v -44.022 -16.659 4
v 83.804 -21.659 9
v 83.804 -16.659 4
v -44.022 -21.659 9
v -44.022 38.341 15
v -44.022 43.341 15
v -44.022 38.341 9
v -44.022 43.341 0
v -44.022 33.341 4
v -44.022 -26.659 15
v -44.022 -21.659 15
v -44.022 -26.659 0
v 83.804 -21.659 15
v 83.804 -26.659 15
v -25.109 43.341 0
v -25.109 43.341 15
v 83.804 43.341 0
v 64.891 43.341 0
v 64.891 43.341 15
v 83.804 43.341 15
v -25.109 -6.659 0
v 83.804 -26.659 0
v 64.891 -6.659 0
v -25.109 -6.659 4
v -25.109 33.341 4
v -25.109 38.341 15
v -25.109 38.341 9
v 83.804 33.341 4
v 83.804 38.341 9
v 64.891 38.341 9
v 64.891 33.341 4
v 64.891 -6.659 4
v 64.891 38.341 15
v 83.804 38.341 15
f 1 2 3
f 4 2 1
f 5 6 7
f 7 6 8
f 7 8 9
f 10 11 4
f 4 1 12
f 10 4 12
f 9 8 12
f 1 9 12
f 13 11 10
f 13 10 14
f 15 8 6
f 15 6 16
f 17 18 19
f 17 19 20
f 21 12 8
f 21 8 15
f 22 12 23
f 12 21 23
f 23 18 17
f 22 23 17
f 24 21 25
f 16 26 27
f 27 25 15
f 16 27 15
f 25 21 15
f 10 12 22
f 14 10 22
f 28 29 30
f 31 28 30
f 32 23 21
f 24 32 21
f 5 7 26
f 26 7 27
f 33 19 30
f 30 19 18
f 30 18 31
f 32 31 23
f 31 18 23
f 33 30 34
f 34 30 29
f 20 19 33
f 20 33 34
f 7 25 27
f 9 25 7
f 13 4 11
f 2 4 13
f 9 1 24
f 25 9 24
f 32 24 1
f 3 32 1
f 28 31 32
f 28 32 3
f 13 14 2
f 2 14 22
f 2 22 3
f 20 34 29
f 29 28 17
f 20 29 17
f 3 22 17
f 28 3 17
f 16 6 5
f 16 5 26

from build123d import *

# Parameters (mm, degrees)
F0_W     = 127.826088
F0_H     = 5
F0_W_2   = 18.913044
F1_DEPTH = 4
F2_DEPTH = 15
F3_SIZE  = 5


with BuildPart() as f1:
    # F0 (on Top) → F1 (new body)
    with BuildSketch(Plane.XY):
        Polygon((-25.108697, 38.340694), (-44.021741, 38.340694), (-44.021741, -21.659306), (83.804347, -21.659306), (83.804347, 38.340694), (64.891303, 38.340694), (64.891303, -6.659306), (-25.108697, -6.659306), align=None)
        with Locations((19.891303, -24.159306)):
            Rectangle(F0_W, F0_H)
        with Locations((-34.565219, 40.840694)):
            Rectangle(F0_W_2, F0_H)
    extrude(amount=F1_DEPTH)

    # F0 (on Top) → F2 (join)
    with BuildSketch(Plane.XY):
        with Locations((19.891303, -24.159306)):
            Rectangle(F0_W, F0_H)
        with Locations((-34.565219, 40.840694)):
            Rectangle(F0_W_2, F0_H)
        with Locations((74.347825, 40.840694)):
            Rectangle(F0_W_2, F0_H)
    extrude(amount=F2_DEPTH)

    # F3
    f3_edges = [f1.edges().sort_by_distance(p)[0] for p in [
        (19.891303, -21.659306, 4),
        (-34.565219, 38.340694, 4),
        (74.347825, 38.340694, 4),
    ]]
    chamfer(f3_edges, length=F3_SIZE)


solid = f1.part
